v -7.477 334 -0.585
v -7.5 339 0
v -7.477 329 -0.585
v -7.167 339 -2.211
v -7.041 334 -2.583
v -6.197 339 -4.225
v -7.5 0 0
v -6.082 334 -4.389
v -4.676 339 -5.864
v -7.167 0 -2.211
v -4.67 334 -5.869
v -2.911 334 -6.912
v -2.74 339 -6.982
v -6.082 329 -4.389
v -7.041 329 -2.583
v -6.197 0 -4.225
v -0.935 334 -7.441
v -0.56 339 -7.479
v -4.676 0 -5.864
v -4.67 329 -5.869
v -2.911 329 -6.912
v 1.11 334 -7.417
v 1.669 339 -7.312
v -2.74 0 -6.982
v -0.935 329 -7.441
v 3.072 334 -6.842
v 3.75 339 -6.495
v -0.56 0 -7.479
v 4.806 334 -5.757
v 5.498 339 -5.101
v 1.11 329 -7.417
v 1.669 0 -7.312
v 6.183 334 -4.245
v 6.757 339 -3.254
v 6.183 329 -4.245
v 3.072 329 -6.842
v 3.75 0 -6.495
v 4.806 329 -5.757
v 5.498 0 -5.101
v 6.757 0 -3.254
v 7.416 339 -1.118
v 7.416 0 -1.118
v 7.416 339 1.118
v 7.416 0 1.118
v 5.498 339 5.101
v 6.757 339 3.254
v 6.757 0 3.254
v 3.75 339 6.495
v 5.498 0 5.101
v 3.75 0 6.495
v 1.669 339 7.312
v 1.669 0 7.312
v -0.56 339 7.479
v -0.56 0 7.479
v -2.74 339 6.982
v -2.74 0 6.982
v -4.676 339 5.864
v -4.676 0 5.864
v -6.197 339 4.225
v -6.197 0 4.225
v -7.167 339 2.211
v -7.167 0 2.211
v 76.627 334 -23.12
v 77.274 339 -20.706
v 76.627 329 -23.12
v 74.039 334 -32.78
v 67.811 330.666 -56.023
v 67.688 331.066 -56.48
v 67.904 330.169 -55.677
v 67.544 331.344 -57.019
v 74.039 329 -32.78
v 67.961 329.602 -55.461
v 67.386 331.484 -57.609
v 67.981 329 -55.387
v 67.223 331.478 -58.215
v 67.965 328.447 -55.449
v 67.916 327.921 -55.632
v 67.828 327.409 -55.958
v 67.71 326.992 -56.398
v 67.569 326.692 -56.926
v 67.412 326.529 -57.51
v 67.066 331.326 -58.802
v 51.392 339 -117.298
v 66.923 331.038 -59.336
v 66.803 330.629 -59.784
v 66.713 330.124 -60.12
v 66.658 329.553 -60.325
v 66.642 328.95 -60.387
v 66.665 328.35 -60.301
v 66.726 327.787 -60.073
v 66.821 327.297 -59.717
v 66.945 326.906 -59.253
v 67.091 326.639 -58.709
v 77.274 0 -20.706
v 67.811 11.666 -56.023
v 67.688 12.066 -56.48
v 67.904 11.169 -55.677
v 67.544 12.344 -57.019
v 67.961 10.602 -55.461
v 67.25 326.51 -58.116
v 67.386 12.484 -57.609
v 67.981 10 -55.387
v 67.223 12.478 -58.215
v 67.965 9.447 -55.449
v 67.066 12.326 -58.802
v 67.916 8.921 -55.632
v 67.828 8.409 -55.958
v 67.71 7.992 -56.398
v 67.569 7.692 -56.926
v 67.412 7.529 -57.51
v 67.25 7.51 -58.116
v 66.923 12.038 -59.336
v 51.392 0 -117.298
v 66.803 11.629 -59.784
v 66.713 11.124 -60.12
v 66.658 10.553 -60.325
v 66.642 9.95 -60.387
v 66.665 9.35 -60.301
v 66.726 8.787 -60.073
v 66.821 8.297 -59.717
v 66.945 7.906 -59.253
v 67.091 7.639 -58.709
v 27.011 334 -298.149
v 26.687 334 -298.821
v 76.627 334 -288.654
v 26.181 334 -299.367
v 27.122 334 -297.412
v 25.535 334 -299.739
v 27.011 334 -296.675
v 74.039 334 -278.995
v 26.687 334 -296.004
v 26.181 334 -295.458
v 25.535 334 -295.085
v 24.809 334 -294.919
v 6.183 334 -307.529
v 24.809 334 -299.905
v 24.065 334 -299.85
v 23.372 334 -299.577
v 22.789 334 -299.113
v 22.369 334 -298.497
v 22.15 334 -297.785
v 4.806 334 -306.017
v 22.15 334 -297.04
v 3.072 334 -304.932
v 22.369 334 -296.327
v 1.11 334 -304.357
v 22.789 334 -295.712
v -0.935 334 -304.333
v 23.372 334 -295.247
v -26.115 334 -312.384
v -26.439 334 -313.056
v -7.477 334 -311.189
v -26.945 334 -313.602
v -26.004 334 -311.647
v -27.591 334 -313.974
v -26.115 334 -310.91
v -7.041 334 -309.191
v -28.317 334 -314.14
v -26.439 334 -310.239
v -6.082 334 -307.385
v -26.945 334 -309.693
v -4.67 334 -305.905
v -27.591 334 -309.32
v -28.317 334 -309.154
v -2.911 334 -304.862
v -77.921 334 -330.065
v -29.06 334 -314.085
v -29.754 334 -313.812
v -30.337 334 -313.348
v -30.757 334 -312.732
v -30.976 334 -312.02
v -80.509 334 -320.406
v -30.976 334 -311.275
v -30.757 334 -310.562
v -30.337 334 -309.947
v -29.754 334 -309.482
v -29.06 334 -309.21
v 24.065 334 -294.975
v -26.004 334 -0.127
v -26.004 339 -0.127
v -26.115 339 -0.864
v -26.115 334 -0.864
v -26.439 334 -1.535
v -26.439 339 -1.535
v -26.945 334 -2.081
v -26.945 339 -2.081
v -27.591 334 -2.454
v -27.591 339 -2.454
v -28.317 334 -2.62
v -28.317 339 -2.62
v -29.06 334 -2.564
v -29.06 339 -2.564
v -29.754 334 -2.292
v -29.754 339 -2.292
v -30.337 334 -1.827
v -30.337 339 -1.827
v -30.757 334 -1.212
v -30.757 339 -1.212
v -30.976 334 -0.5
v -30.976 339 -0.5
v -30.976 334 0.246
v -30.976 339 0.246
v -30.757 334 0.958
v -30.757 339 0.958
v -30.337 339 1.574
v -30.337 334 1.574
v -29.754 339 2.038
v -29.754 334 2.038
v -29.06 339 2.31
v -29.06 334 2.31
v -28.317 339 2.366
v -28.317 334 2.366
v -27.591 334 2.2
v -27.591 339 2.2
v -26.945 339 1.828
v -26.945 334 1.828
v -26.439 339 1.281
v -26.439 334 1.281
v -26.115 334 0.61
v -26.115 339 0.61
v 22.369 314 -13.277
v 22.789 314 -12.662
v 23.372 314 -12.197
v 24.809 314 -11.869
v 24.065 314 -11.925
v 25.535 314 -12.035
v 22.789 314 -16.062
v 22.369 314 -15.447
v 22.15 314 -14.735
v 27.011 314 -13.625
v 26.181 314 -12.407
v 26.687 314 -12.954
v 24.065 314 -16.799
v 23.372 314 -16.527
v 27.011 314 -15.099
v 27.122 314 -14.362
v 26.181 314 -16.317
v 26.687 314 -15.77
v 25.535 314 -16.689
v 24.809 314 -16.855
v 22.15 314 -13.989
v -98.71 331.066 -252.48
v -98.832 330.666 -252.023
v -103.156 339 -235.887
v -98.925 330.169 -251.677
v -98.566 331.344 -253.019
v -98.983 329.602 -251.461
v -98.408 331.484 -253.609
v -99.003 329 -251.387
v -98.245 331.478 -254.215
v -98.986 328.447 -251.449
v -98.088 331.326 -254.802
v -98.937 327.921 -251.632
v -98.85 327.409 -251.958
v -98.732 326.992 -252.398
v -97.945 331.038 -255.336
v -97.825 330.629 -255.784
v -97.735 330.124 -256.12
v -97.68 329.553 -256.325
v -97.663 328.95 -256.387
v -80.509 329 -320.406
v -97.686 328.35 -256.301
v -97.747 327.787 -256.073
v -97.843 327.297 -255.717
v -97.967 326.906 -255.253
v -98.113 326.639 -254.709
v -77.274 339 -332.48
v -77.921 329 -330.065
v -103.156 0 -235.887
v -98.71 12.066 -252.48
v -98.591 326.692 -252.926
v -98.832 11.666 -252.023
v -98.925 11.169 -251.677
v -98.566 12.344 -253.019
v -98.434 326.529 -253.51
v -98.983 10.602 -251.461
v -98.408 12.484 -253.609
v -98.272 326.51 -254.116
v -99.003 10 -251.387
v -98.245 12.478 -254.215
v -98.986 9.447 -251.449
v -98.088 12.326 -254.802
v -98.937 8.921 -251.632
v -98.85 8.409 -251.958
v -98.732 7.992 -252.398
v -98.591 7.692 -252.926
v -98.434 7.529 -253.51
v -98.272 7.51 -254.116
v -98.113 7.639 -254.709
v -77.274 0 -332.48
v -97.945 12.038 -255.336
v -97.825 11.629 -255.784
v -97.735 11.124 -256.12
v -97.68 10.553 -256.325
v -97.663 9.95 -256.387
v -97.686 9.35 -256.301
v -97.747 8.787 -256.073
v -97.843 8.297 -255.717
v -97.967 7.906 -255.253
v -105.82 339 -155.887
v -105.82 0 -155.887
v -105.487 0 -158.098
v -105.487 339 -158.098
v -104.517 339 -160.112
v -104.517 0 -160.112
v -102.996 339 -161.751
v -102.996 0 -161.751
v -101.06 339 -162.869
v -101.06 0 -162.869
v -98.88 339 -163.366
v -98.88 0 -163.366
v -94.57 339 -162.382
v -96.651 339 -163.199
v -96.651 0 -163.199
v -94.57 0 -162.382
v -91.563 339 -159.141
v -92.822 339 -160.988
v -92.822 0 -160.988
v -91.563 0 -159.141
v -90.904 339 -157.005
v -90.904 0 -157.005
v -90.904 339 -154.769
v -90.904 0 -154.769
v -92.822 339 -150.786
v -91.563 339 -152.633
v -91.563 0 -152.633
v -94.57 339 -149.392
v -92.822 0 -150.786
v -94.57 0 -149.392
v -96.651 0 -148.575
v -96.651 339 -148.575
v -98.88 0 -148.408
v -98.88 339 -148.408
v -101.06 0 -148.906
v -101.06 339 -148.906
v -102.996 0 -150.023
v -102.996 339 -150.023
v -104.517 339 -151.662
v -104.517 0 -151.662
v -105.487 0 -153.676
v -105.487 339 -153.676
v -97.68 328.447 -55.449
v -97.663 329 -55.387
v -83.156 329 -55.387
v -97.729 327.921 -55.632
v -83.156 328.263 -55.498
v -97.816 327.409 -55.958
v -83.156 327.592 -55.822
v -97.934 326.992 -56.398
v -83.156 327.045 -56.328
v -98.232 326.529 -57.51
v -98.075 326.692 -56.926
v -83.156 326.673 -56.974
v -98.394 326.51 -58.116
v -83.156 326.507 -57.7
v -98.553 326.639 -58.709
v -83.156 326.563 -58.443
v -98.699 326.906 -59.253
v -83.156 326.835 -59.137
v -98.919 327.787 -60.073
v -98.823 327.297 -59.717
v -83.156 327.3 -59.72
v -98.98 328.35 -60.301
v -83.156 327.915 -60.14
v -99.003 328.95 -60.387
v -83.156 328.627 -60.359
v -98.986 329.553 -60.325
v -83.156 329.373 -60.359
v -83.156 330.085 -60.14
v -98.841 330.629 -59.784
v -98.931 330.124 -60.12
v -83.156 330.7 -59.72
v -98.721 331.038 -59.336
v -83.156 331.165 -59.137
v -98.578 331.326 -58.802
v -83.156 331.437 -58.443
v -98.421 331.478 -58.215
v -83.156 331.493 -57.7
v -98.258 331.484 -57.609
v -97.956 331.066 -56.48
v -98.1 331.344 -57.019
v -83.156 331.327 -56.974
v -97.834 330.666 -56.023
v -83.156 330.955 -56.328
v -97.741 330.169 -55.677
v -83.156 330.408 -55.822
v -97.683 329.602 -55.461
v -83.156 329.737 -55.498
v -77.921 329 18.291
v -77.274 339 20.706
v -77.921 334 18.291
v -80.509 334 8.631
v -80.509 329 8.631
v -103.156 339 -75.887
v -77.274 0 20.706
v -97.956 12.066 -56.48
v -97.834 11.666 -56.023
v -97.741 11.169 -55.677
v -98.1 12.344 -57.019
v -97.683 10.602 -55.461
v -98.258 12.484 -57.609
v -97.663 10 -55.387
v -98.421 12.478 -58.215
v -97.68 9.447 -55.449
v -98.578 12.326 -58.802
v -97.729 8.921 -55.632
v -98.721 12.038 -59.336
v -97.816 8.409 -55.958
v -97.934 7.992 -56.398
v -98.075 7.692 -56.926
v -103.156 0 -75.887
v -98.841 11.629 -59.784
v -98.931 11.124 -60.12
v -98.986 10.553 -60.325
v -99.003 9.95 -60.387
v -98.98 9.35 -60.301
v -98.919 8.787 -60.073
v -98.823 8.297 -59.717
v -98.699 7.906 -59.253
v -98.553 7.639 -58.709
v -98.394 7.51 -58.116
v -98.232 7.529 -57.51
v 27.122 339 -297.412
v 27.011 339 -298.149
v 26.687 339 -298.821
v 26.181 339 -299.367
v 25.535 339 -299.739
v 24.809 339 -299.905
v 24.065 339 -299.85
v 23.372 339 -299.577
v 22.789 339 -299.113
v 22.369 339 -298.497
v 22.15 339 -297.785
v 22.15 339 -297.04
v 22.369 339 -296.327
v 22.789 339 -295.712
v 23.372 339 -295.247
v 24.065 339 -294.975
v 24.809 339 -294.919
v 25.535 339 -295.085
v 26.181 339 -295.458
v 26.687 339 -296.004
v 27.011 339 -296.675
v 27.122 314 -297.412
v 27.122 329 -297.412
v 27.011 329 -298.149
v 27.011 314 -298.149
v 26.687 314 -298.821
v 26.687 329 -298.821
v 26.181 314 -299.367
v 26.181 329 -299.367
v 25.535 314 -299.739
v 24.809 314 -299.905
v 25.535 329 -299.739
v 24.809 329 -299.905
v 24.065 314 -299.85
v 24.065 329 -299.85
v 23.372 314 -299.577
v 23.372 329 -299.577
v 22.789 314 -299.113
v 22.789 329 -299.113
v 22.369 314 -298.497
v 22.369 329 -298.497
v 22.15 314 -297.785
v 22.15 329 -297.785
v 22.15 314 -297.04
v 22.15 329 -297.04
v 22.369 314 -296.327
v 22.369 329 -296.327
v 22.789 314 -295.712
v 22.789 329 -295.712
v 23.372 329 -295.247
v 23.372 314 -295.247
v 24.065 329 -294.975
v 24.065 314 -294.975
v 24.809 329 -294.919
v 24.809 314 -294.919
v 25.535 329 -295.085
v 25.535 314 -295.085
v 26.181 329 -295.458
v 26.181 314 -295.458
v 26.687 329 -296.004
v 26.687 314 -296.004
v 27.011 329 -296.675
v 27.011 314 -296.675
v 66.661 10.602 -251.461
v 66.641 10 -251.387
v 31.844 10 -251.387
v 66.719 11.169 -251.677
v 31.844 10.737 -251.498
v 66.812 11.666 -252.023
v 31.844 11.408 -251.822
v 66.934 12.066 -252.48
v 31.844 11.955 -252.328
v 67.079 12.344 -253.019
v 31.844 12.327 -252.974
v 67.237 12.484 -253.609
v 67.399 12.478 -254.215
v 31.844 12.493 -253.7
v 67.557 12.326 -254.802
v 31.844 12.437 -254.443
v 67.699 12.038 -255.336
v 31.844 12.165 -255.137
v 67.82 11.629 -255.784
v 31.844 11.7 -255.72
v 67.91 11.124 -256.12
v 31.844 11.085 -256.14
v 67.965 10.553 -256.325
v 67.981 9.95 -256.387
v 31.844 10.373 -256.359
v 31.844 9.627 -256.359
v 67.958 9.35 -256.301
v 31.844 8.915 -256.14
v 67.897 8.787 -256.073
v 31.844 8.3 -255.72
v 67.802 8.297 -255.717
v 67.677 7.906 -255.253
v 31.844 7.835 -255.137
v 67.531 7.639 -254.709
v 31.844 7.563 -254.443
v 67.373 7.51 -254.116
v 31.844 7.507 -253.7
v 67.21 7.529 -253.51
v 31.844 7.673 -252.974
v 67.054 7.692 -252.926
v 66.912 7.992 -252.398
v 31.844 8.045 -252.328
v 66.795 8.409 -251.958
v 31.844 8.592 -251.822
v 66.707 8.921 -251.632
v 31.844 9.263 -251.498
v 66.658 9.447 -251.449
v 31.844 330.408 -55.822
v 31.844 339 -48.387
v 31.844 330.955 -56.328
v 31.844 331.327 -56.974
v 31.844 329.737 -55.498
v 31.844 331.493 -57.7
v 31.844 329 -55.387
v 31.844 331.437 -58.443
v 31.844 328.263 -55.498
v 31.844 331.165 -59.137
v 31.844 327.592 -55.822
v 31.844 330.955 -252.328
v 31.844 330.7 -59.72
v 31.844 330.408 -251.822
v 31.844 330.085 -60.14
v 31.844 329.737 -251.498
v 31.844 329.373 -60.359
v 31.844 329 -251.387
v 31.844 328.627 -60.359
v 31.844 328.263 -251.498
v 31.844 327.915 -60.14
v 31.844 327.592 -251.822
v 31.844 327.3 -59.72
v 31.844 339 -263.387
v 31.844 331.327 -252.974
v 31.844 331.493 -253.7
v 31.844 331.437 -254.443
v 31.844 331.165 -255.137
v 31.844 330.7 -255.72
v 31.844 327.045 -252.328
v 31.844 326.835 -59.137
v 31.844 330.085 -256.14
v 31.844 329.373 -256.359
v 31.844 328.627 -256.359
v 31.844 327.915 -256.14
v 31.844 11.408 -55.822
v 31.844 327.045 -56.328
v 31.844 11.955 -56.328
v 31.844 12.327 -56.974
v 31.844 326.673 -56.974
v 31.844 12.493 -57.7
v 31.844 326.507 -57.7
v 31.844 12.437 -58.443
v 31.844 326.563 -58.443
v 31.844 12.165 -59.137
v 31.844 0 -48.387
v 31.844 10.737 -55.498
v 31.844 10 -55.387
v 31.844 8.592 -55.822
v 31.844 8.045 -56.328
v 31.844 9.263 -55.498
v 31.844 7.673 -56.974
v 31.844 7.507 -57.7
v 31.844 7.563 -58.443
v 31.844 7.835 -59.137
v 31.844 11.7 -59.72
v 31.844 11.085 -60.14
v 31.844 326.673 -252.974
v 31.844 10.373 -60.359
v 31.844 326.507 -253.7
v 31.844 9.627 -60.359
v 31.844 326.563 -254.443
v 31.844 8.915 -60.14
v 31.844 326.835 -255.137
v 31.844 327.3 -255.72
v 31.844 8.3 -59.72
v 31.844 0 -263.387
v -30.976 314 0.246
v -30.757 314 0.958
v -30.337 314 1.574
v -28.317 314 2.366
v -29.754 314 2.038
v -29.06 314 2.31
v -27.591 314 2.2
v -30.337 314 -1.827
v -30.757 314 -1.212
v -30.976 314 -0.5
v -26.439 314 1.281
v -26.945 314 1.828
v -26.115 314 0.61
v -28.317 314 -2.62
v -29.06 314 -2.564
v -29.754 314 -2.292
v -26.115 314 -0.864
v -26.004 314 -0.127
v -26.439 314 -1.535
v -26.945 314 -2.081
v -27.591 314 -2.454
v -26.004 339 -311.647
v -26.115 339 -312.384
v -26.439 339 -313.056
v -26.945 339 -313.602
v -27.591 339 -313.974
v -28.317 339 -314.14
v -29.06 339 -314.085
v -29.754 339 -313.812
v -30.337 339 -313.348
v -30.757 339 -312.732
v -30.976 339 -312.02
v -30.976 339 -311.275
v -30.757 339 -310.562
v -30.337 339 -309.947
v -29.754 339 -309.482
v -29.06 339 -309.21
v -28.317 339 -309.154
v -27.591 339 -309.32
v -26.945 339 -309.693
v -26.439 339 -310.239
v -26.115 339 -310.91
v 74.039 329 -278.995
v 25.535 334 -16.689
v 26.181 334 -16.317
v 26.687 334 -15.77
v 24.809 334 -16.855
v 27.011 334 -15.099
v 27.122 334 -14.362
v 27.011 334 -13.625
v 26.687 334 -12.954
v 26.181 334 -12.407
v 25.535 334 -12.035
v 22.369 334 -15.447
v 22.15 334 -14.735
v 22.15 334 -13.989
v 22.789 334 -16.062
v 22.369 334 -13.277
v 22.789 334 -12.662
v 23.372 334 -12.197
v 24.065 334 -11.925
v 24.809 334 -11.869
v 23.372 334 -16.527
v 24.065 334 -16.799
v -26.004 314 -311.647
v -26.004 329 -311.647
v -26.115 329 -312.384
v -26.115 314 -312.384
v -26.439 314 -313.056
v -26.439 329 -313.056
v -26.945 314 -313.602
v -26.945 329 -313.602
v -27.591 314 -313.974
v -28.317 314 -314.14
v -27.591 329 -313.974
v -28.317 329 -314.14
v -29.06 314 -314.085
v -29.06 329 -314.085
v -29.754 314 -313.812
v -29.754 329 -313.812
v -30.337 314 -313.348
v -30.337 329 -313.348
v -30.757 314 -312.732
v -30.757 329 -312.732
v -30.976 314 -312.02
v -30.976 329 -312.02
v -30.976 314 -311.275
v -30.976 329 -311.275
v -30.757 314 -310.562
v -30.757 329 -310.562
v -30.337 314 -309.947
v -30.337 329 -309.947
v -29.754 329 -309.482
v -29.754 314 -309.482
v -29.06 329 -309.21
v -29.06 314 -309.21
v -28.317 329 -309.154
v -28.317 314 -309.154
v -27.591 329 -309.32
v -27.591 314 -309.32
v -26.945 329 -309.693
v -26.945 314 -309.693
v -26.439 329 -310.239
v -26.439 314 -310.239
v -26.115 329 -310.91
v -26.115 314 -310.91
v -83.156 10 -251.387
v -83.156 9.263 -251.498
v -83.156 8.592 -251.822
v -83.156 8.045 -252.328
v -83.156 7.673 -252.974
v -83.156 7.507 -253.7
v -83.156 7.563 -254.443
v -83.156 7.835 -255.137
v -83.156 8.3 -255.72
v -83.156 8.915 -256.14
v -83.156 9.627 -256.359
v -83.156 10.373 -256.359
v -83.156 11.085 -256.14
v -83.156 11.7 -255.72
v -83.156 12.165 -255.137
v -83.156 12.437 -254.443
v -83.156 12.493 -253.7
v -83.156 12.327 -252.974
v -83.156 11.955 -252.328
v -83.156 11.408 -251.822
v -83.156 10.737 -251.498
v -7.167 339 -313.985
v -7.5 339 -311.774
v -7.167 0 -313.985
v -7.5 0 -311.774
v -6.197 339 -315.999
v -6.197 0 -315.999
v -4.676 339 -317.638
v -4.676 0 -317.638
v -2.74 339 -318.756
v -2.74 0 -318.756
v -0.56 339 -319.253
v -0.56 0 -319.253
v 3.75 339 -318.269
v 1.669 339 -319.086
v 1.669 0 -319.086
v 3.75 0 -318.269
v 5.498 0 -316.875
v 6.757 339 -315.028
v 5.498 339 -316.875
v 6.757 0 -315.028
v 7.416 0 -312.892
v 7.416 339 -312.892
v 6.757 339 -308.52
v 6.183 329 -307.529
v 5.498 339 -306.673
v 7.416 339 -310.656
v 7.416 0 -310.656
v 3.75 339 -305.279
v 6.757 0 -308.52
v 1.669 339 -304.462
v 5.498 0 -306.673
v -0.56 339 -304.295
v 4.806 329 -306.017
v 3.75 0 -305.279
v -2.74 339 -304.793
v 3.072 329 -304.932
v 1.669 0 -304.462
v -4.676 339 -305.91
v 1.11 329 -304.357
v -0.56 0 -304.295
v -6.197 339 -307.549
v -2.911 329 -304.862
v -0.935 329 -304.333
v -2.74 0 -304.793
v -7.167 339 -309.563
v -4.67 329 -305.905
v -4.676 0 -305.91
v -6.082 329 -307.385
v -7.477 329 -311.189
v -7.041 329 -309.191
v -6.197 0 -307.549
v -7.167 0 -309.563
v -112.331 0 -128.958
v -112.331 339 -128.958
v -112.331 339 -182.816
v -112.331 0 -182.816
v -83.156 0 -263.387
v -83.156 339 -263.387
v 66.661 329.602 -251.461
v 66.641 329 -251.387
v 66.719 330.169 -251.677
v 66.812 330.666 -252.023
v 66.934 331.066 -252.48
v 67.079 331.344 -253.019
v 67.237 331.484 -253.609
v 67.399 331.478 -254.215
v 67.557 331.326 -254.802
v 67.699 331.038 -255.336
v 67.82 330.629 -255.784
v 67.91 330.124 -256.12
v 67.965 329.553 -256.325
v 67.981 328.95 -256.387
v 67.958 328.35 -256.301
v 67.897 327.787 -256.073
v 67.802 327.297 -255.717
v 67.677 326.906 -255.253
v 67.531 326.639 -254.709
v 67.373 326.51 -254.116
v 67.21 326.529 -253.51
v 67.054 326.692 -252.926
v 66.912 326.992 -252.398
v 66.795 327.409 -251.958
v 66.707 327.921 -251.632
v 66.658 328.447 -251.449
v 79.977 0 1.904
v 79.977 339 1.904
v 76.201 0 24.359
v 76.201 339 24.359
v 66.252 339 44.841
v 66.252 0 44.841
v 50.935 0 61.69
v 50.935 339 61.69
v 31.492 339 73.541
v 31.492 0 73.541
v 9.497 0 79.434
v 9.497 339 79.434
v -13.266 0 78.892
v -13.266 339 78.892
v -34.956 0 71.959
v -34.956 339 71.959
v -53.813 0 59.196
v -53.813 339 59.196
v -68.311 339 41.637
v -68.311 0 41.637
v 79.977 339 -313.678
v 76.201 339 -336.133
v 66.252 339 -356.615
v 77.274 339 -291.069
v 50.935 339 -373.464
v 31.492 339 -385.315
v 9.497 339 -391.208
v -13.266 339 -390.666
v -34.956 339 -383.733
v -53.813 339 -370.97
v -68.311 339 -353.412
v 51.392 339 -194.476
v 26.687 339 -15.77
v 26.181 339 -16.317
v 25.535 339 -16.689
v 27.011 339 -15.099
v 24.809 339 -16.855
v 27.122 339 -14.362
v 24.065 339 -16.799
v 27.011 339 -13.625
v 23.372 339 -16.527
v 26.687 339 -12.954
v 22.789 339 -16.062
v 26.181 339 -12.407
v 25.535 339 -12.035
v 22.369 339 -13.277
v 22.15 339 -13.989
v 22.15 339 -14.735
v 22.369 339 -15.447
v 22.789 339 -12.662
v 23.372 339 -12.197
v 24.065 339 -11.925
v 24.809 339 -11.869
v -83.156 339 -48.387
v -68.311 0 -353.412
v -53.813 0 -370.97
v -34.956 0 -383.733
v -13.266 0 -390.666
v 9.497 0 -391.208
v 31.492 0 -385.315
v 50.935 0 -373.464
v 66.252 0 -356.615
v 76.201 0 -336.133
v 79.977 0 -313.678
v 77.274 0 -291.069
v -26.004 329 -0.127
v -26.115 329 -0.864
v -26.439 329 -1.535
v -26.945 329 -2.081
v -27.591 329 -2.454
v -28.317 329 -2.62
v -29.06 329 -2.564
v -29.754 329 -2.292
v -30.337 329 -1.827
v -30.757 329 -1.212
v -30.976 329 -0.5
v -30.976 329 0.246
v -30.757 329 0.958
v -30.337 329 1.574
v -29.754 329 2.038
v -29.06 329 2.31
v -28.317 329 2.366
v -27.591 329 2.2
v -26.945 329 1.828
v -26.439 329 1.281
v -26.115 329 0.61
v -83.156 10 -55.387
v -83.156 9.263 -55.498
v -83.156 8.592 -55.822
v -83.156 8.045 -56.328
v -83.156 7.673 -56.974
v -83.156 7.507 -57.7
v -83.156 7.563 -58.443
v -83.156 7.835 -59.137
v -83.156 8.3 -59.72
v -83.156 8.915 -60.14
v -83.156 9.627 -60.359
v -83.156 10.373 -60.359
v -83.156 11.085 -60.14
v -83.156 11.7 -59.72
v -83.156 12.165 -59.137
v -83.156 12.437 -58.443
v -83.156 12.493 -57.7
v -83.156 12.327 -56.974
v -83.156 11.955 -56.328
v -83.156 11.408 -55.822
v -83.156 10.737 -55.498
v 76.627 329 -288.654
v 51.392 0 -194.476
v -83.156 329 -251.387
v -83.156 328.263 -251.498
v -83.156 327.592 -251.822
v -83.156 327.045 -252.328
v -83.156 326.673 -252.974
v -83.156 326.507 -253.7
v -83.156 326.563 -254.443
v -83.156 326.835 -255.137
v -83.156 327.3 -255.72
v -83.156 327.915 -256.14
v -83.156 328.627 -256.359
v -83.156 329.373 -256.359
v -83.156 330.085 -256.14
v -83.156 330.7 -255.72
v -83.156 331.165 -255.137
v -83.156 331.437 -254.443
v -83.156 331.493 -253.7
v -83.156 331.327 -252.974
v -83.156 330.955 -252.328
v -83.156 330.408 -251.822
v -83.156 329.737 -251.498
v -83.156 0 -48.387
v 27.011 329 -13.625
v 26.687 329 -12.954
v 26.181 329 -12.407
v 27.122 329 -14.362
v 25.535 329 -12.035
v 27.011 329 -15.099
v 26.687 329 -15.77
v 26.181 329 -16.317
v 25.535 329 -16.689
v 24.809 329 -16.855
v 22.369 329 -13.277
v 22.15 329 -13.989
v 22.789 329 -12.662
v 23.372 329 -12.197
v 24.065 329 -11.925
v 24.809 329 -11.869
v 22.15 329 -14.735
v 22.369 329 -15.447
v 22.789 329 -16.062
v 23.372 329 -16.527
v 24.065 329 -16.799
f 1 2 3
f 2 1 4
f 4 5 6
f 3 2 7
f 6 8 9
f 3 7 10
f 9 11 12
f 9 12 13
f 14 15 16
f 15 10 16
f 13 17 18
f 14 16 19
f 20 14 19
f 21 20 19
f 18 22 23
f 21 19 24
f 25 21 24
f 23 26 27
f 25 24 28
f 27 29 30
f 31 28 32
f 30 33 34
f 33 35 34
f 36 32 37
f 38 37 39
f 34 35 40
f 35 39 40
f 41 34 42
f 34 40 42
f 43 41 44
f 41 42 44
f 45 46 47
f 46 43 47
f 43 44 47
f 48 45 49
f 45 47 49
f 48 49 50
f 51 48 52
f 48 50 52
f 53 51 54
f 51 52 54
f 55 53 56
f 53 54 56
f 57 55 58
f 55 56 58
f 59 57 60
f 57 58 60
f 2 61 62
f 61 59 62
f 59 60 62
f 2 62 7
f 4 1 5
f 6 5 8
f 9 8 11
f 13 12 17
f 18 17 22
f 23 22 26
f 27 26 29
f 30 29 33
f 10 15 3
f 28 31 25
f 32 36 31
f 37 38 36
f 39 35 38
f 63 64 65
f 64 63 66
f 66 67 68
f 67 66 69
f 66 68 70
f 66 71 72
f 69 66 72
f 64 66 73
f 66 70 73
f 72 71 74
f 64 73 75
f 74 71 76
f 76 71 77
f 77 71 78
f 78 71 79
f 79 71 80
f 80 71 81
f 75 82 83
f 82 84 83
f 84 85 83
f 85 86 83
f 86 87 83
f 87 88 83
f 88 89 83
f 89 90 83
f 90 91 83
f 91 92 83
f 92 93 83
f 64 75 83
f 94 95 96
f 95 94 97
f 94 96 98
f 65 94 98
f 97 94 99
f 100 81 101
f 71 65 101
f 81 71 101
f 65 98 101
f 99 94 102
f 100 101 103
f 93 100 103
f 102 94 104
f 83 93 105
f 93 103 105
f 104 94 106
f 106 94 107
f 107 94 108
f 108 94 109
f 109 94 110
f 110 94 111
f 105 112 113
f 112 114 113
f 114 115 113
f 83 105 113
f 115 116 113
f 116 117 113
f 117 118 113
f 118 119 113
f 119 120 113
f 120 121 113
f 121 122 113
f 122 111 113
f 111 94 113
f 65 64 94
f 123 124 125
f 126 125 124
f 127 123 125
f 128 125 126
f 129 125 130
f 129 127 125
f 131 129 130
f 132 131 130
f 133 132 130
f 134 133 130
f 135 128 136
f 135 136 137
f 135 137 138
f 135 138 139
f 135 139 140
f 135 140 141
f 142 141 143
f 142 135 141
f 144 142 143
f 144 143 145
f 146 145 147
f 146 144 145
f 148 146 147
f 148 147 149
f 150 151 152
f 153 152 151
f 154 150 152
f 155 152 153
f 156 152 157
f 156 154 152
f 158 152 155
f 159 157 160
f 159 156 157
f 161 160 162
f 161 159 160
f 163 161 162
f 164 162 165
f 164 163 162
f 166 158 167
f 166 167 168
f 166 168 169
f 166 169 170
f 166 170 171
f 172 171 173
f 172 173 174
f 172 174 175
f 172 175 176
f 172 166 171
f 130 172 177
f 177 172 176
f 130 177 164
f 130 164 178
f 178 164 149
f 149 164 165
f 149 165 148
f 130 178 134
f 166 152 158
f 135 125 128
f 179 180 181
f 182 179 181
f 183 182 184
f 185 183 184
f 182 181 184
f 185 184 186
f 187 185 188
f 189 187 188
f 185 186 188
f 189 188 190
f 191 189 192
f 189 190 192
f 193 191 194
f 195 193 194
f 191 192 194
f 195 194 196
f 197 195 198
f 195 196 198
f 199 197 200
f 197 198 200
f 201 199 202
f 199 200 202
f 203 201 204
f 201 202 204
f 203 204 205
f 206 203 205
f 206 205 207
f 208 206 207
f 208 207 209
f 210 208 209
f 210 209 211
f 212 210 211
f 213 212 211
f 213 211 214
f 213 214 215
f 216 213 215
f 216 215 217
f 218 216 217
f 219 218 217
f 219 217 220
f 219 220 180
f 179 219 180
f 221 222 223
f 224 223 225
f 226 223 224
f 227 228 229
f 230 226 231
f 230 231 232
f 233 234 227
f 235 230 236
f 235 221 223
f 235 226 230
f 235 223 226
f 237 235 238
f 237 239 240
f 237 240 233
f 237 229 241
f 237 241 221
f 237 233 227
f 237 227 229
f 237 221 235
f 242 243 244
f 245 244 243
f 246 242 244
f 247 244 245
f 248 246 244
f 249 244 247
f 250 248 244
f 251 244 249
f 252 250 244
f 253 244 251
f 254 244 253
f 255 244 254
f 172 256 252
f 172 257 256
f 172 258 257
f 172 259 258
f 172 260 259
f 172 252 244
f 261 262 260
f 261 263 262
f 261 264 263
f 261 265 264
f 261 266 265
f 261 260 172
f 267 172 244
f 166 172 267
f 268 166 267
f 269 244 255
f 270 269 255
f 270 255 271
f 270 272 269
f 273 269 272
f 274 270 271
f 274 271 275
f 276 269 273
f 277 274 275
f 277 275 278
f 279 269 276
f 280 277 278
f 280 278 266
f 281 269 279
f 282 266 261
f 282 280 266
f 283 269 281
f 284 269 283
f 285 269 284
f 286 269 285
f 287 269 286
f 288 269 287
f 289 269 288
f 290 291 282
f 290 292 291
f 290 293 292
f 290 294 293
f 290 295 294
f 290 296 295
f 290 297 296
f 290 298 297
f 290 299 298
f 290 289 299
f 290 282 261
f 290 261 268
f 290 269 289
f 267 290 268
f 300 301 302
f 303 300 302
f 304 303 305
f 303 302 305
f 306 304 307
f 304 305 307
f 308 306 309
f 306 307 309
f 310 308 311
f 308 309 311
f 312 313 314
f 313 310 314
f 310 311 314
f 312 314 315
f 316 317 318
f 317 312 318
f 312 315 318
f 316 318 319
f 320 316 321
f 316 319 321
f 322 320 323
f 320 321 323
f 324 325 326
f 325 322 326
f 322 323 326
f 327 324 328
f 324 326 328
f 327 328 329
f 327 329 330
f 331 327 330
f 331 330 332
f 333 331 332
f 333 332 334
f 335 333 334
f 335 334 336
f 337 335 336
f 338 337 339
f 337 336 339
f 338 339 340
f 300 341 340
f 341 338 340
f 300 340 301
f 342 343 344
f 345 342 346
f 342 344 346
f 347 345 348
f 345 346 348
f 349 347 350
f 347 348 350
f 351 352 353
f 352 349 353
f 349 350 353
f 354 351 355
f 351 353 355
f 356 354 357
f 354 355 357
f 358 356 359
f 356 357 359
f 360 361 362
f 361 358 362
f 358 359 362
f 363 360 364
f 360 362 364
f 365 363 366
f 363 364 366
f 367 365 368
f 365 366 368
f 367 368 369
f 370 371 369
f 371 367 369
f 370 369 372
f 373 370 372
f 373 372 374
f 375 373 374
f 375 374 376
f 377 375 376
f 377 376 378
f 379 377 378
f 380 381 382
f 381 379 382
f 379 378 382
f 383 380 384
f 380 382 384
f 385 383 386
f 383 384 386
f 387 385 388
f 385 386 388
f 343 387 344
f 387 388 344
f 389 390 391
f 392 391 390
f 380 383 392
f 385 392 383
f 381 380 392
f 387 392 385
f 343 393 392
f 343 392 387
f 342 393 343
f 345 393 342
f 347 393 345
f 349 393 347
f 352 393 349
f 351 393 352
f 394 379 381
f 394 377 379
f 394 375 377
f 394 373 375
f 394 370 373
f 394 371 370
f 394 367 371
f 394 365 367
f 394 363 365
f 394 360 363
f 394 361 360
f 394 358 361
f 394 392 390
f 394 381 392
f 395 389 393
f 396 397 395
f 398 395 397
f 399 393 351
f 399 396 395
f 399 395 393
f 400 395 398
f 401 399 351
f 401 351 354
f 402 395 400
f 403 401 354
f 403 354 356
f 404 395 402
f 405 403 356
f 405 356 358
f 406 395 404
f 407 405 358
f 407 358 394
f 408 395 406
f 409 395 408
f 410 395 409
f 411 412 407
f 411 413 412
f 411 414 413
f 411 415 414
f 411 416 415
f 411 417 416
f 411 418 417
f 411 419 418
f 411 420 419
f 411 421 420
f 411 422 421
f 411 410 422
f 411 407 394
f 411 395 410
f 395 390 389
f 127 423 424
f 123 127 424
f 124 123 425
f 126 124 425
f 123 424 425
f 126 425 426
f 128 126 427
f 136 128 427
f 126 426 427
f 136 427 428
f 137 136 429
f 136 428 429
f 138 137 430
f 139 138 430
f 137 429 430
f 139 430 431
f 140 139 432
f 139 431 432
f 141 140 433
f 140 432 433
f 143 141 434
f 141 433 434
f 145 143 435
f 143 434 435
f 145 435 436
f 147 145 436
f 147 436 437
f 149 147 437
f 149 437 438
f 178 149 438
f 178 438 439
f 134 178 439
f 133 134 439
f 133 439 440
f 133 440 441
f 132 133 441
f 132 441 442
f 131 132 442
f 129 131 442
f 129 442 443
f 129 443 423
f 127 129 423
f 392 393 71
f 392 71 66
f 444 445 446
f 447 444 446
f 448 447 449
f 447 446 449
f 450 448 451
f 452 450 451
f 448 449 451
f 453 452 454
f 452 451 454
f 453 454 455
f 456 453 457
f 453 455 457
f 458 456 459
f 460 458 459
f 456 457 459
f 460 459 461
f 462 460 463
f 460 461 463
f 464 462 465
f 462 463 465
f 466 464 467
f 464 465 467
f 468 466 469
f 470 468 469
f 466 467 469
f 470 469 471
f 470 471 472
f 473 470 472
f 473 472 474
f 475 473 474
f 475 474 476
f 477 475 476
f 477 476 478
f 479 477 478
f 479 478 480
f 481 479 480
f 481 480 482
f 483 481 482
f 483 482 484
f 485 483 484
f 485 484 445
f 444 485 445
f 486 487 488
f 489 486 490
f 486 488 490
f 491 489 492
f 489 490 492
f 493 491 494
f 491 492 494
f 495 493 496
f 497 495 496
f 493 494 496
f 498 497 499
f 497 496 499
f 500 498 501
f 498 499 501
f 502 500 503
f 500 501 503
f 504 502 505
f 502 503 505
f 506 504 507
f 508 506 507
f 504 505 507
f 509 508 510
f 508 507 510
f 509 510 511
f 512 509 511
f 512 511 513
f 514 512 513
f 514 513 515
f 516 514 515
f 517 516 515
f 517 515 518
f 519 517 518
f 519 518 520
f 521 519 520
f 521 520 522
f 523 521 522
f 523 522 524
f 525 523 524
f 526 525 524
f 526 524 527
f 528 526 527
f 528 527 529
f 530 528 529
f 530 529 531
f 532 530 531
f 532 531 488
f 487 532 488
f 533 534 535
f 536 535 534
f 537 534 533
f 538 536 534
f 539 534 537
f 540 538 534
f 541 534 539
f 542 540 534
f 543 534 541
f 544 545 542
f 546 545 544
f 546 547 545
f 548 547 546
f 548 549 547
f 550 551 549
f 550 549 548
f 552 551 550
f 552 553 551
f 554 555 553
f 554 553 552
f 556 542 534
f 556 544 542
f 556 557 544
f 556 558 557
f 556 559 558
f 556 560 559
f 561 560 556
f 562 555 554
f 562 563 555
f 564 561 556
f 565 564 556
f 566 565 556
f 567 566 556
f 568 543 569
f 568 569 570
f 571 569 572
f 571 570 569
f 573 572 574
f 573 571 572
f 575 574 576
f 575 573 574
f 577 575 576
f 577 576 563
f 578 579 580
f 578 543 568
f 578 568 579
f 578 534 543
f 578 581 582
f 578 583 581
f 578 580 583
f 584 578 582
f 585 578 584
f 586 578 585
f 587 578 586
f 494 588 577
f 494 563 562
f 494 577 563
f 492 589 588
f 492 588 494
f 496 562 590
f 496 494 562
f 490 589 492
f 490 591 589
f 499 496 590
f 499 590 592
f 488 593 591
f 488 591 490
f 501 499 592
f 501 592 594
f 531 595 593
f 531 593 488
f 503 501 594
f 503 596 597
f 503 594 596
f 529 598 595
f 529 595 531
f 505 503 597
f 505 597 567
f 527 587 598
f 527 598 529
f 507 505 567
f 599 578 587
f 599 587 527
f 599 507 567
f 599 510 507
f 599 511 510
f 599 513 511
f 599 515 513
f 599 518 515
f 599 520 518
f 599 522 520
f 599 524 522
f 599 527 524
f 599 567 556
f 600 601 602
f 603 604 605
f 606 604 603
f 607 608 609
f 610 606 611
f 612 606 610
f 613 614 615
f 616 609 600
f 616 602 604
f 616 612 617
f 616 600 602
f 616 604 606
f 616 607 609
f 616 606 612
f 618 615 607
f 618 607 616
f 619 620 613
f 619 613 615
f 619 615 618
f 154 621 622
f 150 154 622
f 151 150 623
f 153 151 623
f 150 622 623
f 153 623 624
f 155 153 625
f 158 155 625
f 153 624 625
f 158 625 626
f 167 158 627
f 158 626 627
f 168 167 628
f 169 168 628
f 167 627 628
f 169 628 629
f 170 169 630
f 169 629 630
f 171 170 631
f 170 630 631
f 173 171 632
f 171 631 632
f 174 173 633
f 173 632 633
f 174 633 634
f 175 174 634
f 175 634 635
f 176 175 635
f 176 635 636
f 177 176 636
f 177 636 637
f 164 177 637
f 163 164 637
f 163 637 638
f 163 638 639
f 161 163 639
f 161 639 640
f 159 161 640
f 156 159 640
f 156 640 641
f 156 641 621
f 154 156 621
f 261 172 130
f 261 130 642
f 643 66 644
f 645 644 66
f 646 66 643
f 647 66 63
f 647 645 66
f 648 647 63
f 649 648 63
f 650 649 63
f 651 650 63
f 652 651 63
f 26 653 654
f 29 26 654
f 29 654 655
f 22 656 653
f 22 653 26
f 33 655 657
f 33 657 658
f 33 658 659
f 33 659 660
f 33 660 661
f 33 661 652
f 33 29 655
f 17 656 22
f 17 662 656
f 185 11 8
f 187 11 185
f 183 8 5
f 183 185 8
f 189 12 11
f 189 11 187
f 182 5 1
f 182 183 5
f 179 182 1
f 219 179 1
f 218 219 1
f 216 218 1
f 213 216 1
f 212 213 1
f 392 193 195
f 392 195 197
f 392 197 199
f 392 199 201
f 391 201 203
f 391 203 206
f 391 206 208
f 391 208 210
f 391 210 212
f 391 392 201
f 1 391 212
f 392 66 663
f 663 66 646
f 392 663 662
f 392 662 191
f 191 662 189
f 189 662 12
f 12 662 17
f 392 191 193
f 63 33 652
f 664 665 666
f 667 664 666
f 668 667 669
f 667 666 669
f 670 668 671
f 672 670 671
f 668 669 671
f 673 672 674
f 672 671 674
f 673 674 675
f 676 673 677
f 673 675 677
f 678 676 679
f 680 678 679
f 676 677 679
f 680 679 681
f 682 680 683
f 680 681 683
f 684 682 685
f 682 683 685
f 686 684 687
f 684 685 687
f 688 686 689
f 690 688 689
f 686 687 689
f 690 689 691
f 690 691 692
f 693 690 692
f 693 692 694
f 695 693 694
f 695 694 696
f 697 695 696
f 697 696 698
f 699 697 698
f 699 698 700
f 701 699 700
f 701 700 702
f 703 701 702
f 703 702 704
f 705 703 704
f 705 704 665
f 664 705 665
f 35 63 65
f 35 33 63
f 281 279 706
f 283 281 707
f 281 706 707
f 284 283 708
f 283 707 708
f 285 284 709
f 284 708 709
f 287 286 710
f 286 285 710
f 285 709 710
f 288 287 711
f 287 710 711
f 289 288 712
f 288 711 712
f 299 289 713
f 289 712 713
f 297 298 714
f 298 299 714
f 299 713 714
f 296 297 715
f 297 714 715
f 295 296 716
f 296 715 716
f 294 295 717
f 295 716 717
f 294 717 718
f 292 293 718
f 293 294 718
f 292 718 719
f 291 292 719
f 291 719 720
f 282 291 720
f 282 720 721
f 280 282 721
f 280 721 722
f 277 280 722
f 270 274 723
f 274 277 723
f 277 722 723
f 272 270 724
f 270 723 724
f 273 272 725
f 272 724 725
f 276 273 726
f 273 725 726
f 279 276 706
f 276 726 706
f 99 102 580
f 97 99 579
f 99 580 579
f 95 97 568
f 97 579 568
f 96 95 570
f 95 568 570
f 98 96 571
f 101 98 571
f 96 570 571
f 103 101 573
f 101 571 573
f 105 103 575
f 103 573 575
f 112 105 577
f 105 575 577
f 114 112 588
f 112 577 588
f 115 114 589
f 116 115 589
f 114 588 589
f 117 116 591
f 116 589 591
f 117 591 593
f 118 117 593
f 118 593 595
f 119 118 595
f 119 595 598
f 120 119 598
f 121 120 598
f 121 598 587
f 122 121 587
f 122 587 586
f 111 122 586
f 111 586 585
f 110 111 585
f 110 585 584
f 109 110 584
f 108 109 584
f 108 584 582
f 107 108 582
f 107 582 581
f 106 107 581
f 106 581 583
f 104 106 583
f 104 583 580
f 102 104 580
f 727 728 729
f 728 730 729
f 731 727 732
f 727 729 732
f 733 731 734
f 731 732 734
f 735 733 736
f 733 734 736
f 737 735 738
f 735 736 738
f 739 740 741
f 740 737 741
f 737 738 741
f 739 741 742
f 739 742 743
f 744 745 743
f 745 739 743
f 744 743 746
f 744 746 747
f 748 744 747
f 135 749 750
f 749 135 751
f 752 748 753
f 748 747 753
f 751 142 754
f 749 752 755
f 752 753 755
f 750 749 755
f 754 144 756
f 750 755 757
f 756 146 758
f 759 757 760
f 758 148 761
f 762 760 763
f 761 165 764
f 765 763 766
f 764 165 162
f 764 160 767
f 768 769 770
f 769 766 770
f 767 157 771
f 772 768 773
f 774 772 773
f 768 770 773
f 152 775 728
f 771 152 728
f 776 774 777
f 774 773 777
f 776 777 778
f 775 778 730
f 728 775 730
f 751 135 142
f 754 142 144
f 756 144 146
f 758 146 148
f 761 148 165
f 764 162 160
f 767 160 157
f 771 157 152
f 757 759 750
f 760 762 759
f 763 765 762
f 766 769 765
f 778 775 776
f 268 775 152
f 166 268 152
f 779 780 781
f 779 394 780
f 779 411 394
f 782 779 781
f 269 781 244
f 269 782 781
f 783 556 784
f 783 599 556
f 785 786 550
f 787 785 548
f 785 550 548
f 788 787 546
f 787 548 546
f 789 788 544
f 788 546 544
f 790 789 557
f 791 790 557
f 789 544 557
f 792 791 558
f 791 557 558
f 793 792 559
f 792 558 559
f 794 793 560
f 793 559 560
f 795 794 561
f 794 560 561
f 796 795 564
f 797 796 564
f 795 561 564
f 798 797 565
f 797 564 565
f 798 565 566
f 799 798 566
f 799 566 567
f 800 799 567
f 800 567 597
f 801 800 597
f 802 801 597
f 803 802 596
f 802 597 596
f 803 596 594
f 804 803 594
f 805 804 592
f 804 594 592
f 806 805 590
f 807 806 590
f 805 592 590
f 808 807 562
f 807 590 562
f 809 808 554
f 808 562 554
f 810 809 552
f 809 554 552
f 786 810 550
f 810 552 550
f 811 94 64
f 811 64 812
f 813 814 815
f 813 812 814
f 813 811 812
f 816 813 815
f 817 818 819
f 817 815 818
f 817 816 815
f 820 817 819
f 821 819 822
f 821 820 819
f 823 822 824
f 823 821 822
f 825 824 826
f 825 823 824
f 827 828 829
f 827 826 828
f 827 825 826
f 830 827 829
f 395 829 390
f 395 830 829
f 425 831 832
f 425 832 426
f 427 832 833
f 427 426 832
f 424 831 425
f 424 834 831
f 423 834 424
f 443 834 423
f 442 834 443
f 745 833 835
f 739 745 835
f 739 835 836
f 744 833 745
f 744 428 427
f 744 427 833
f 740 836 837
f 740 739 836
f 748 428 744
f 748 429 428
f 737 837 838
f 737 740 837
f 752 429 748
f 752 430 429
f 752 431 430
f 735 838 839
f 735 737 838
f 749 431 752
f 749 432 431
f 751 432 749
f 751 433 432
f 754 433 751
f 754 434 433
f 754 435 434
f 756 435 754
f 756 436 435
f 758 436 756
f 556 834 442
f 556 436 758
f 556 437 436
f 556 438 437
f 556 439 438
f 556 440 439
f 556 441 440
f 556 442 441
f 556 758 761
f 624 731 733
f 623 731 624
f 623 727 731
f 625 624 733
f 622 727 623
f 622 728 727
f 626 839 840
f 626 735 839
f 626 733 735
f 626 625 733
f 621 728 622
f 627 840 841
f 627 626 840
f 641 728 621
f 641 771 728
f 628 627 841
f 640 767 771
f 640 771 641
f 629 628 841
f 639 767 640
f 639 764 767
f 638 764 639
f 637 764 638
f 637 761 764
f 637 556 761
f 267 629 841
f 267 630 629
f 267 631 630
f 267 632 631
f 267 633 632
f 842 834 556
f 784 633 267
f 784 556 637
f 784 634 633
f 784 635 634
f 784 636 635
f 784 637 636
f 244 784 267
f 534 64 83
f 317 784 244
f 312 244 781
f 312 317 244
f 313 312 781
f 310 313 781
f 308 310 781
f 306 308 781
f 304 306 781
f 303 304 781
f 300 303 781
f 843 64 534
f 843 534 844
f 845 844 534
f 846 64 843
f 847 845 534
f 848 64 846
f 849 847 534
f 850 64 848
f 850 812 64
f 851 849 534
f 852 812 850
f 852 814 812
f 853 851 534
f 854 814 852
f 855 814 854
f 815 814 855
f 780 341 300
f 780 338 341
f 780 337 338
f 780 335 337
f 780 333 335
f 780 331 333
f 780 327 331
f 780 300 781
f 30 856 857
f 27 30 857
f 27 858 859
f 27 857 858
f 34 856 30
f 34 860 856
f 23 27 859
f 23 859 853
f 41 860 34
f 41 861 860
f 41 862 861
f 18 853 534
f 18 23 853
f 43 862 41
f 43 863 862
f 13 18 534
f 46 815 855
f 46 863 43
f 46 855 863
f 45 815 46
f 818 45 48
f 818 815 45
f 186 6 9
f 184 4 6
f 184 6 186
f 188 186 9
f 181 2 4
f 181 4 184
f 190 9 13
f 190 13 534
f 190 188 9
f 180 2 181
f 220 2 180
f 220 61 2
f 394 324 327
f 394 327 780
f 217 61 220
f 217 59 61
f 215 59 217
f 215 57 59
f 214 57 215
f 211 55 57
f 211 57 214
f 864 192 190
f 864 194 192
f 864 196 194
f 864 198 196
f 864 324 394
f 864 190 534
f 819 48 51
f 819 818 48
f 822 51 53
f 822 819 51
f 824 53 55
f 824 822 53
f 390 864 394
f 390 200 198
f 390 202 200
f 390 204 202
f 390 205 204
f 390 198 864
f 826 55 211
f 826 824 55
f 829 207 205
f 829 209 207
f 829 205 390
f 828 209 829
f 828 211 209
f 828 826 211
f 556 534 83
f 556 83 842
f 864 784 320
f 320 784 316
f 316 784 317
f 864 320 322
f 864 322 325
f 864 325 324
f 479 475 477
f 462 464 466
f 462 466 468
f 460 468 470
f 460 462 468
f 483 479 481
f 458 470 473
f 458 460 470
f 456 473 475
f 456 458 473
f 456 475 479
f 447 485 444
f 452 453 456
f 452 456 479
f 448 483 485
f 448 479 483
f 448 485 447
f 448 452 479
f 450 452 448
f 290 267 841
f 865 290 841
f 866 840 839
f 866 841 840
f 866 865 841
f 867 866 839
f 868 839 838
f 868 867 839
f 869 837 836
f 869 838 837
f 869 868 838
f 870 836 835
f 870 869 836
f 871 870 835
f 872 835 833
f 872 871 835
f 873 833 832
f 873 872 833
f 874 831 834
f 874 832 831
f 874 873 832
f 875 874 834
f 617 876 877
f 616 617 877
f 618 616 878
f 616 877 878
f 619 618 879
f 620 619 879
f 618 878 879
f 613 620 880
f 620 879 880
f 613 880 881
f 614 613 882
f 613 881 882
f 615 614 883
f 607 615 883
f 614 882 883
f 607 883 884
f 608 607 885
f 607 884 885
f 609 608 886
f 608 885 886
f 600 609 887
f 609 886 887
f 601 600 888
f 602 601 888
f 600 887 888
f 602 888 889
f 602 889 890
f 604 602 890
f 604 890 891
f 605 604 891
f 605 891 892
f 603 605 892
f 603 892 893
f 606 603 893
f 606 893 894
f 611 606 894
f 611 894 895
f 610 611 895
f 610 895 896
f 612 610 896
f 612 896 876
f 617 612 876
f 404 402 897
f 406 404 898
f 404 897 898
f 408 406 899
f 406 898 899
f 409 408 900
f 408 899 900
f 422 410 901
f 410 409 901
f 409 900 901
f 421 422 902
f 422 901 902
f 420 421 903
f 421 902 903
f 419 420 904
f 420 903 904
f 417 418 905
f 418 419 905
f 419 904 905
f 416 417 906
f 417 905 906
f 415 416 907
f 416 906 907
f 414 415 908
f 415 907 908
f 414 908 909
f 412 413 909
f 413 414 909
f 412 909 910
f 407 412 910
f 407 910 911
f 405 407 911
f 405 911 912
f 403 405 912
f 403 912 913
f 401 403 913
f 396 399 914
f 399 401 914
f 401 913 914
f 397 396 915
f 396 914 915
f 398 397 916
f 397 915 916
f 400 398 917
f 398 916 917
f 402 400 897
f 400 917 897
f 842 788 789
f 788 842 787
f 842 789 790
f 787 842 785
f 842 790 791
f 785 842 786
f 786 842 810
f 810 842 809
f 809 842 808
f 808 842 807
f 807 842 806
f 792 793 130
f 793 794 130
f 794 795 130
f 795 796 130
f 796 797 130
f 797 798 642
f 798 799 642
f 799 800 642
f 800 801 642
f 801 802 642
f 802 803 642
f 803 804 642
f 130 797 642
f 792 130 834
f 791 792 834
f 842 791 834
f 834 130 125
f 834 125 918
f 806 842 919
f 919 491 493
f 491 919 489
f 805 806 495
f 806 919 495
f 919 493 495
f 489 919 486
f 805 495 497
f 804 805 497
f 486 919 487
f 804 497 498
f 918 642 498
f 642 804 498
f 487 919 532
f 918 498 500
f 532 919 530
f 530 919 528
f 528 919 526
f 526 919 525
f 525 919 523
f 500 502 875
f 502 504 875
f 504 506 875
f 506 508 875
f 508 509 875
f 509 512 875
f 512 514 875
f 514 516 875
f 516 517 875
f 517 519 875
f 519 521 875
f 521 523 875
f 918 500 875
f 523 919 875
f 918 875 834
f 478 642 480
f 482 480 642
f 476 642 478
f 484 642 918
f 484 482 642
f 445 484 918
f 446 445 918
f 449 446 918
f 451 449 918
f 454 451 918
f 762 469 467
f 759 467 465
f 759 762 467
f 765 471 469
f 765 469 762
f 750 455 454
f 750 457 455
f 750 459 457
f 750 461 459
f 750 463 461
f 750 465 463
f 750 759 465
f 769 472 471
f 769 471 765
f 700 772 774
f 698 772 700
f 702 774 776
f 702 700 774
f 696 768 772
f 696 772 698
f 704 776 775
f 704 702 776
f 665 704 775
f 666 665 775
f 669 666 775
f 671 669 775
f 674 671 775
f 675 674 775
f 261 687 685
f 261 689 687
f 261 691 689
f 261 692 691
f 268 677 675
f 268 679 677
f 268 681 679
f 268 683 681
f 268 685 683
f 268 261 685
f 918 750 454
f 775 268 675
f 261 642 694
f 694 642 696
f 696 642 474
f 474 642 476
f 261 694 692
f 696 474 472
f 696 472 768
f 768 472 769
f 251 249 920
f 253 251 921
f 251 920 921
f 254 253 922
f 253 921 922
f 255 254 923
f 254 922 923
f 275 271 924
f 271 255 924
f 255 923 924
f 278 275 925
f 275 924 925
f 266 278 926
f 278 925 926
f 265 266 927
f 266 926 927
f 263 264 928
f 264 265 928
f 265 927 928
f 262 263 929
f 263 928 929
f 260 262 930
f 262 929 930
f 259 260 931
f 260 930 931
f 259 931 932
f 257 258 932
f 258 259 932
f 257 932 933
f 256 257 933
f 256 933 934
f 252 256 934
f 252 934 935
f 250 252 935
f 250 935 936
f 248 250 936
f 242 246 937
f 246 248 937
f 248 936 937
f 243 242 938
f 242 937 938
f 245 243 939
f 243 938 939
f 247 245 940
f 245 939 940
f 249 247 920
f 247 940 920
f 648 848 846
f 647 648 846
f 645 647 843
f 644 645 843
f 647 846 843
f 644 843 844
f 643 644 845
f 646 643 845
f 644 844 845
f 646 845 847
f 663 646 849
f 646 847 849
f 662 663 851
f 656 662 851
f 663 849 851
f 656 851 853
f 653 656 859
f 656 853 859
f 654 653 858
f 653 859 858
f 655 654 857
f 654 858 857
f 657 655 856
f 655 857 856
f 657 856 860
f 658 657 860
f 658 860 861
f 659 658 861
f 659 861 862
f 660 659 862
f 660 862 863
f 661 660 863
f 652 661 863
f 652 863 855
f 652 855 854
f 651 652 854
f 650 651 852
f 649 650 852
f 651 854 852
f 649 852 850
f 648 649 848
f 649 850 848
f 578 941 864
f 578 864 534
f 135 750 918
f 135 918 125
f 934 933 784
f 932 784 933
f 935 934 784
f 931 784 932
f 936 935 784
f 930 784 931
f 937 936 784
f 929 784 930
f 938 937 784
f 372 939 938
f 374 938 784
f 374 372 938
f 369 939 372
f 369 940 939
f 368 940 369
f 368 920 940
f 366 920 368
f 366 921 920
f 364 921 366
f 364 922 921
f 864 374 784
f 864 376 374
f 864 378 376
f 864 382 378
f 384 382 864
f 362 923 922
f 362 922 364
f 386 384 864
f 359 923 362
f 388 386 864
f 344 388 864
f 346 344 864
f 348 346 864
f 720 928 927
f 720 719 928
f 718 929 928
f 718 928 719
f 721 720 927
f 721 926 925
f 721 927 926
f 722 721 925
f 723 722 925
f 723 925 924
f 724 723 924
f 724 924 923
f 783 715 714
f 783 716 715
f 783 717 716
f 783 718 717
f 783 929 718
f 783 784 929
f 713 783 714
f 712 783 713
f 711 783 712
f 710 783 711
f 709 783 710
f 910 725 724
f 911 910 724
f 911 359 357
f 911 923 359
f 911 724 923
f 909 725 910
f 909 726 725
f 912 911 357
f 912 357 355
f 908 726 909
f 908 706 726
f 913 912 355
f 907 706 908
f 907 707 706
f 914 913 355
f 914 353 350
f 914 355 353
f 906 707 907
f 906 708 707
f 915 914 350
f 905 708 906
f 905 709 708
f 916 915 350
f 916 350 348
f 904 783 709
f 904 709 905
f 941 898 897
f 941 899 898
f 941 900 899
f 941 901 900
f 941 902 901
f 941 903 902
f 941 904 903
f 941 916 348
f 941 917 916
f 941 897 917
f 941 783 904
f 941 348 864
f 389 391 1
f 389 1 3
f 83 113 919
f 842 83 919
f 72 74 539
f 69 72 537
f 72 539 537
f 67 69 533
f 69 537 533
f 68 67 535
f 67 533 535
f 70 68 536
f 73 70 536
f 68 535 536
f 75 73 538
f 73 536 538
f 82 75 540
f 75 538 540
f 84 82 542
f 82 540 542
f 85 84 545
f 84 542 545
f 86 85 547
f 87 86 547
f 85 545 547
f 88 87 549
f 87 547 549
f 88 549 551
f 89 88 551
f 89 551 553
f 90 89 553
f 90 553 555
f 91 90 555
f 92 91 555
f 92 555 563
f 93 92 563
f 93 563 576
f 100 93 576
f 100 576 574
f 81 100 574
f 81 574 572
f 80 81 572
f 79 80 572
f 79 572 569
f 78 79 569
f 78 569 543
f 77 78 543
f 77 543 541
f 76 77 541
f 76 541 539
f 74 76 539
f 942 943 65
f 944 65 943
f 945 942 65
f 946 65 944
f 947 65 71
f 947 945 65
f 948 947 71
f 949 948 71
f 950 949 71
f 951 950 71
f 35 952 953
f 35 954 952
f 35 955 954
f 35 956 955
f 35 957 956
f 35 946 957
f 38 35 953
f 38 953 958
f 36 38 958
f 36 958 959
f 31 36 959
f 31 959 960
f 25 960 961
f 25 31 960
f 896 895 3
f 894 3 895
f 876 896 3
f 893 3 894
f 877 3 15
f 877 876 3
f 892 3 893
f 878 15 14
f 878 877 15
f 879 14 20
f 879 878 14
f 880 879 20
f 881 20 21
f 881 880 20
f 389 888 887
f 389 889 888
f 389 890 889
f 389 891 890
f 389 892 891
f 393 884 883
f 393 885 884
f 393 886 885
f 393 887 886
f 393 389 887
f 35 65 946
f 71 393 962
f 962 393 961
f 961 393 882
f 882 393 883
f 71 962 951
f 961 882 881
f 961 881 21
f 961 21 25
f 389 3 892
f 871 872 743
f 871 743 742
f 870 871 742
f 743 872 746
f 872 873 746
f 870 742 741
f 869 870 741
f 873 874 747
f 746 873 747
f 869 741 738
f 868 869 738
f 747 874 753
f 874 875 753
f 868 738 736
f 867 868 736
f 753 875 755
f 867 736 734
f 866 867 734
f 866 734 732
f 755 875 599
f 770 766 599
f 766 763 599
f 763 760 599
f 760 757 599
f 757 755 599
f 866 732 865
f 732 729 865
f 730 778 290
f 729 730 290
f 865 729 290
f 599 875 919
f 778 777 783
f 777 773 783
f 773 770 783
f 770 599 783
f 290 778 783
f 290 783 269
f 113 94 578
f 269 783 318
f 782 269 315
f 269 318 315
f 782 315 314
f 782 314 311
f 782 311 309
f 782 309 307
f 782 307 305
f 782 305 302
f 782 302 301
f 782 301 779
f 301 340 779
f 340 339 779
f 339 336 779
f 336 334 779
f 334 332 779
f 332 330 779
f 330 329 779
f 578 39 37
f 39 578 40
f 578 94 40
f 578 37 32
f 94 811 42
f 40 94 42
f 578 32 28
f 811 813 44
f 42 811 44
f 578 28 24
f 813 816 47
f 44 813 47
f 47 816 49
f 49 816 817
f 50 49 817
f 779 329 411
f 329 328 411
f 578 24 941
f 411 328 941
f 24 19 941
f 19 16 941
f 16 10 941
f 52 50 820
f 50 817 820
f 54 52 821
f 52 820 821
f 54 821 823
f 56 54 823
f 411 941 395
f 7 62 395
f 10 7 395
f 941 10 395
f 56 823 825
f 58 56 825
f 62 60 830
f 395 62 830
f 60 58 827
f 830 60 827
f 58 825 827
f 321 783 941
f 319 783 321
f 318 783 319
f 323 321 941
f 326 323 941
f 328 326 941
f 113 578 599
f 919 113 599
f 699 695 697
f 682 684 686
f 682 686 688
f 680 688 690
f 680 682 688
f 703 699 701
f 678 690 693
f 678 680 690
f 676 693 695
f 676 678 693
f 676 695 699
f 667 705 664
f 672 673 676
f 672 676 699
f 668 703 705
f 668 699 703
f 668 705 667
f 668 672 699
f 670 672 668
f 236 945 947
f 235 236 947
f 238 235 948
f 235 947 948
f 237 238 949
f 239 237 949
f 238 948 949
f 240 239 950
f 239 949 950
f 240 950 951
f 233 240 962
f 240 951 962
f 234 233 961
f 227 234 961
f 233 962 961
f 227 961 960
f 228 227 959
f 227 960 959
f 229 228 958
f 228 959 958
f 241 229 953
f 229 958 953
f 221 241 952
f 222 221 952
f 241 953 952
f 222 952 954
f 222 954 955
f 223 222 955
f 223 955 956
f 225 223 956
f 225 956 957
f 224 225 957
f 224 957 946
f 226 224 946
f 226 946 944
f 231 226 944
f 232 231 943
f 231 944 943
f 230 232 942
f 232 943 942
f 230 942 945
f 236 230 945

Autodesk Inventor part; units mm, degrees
ref_plane "YZ Plane" through (0, 0, 0) normal (1, 0, 0) x (0, 1, 0)
ref_plane "XZ Plane" through (0, 0, 0) normal (0, 1, 0) x (-1, 0, 0)
ref_plane "XY Plane" through (0, 0, 0) normal (0, 0, 1) x (1, 0, 0)
sketch "Sketch2" plane through (0, 0, 0) normal (0, 1, 0) x (-1, 0, 0)
  circle A0 centre (0, 0) radius 80 construction
  line L0 (77.2741, 20.7055) -> (103.156, -75.8871)
  line L1 (-77.2741, -20.7055) -> (-51.3922, -117.2981)
  line L2 (103.156, -75.8871) -> (-51.3922, -117.2981) construction
  line L3 (103.156, -75.8871) -> (103.156, -235.8871) construction
  line L4 (103.156, -235.8871) -> (-51.3922, -194.476) construction
  line L5 (-51.3922, -117.2981) -> (-51.3922, -194.476)
  circle A1 centre (0, -311.7741) radius 80 construction
  line L6 (-51.3922, -194.476) -> (-77.2741, -291.0686)
  line L7 (103.156, -235.8871) -> (77.2741, -332.4796)
  arc A2 (77.2741, 20.7055) -> (-77.2741, -20.7055) centre (0, 0) ccw
  arc A3 (-77.2741, -291.0686) -> (77.2741, -332.4796) centre (0, -311.7741) ccw
  circle A4 centre (0, 0) radius 7.5
  circle A5 centre (0, -311.7741) radius 7.5
  line L8 (83.156, -48.3871) -> (-31.844, -48.3871)
  line L9 (-31.844, -48.3871) -> (-31.844, -263.3871)
  line L10 (-31.844, -263.3871) -> (83.156, -263.3871)
  line L11 (83.156, -263.3871) -> (83.156, -48.3871)
  arc A6 (103.156, -235.8871) -> (103.156, -75.8871) centre (-201.516, -155.8871) ccw
  circle A7 centre (98.32, -155.8871) radius 7.5
  point P0 (103.156, -155.8871)
  point P1 (83.156, -155.8871)
  dimension "d0" = 160
  dimension "d1" = 100
  dimension "d2" = 100
  dimension "d3" = 160
  dimension "d4" = 160
  dimension "d5" = 160
  dimension "d6" = 75
  dimension "d7" = 75
  dimension "d8" = 160
  dimension "d9" = 100
  dimension "d10" = 100
  dimension "d11" = 15
  dimension "d12" = 15
  dimension "d13" = 115
  dimension "d14" = 215
  dimension "d15" = 20
  dimension "d39" = 315
  dimension "d40" = 15
  dimension "d41" = 15.164
extrude "Extrusion1" add sketch "Sketch2" along normal blind 339
sketch "Sketch5" plane through (31.844, 0, -48.3871) normal (-1, 0, 0) x (0, 0, 1)
  line L0 (0, 0) -> (-215, 0) construction
  line L1 (0, 0) -> (0, 339) construction
  line L2 (-215, 339) -> (0, 339) construction
  line L3 (-215, 0) -> (-215, 339) construction
  line L4 (-68.911, 0) -> (27.6815, 0) construction
  line L5 (0, 339) -> (-19, 339) construction
  line L6 (-19, 339) -> (-19, 0) construction
  line L7 (-19, 0) -> (0, 0) construction
  line L8 (0, 0) -> (0, 339) construction
  line L9 (-146.089, 339) -> (-242.6815, 339) construction
  line L10 (-215, 0) -> (-196, 0) construction
  line L11 (-196, 0) -> (-196, 339) construction
  line L12 (-196, 339) -> (-215, 339) construction
  line L13 (-215, 339) -> (-215, 0) construction
  circle A0 centre (-205.5, 329) radius 2.5
  circle A1 centre (-205.5, 10) radius 2.5
  circle A2 centre (-9.5, 329) radius 2.5
  circle A3 centre (-9.5, 10) radius 2.5
  point P0 (-205.5, 0)
  point P1 (-205.5, 339)
  point P2 (-9.5, 0)
  point P3 (-9.5, 339)
  dimension "d52" = 19
  dimension "d53" = 19
  dimension "d54" = 5
  dimension "d55" = 10
  dimension "d56" = 5
  dimension "d57" = 10
  dimension "d58" = 5
  dimension "d59" = 5
  dimension "d60" = 10
  dimension "d61" = 10
extrude "Extrusion4" cut sketch "Sketch5" along normal through all both and the other way through all
sketch "Sketch6" plane through (0, 339, 0) normal (0, 1, 0) x (1, 0, 0)
  line L0 (-28.5041, 0.1269) -> (24.6218, 14.362) construction
  line L1 (-103.156, 75.8871) -> (-77.2741, -20.7055) construction
  line L2 (-77.2741, -20.7055) -> (-103.156, 75.8871) construction
  line L3 (-103.156, 75.8871) -> (51.3922, 117.2981) construction
  line L4 (-25.8819, 96.5926) -> (-1.9411, 7.2444) construction
  circle A0 centre (-28.5041, 0.1269) radius 2.5
  circle A1 centre (24.6218, 14.362) radius 2.5
  line L5 (-103.156, 235.8871) -> (-77.2741, 332.4796) construction
  line L6 (51.3922, 194.476) -> (77.2741, 291.0686) construction
  line L7 (-103.156, 235.8871) -> (51.3922, 194.476) construction
  line L8 (-25.8819, 215.1815) -> (-1.9411, 304.5297) construction
  line L9 (24.6218, 297.4122) -> (-28.5041, 311.6472) construction
  circle A2 centre (-28.5041, 311.6472) radius 2.5
  circle A3 centre (24.6218, 297.4122) radius 2.5
  point P0 (0, 0)
  dimension "d64" = 55
  dimension "d65" = 92.5
  dimension "d66" = 5
  dimension "d67" = 5
  dimension "d68" = 92.5
  dimension "d69" = 5
  dimension "d70" = 5
  dimension "d71" = 55
extrude "Extrusion5" cut sketch "Sketch6" against normal blind 25
sketch "Sketch9" plane through (-77.2741, 0, 20.7055) normal (-0.9659258, 0, 0.258819) x (0.258819, 0, 0.9659258)
  line L0 (-10, 314) -> (-5, 314) projected
  line L1 (-10, 339) -> (-5, 339) projected
  line L2 (-10, 314) -> (-5, 314) projected
  line L3 (-10, 339) -> (-5, 339) projected
  line L4 (-12.5, 334) -> (-2.5, 334)
  line L5 (-2.5, 334) -> (-2.5, 329)
  line L6 (-2.5, 329) -> (-12.5, 329)
  line L7 (-12.5, 329) -> (-12.5, 334)
  point P0 (0, 0)
  point P1 (-7.5, 334)
  point P2 (-7.5, 339)
  dimension "d80" = 10
  dimension "d81" = 5
  dimension "d82" = 5
extrude "Extrusion7" cut sketch "Sketch9" against normal through all
sketch "Sketch10" plane through (-103.156, 0, -235.8871) normal (-0.9659258, 0, -0.258819) x (-0.258819, 0, 0.9659258)
  line L0 (-95, 314) -> (-90, 314) projected
  line L1 (-95, 339) -> (-90, 339) projected
  line L2 (-97.5, 334) -> (-87.5, 334)
  line L3 (-87.5, 334) -> (-87.5, 329)
  line L4 (-87.5, 329) -> (-97.5, 329)
  line L5 (-97.5, 329) -> (-97.5, 334)
  point P0 (201.1507, 0)
  point P1 (-92.5, 334)
  point P2 (-92.5, 339)
  dimension "d85" = 10
  dimension "d86" = 5
  dimension "d87" = 5
extrude "Extrusion8" cut sketch "Sketch10" against normal through all
properties part number "TA001" material "ABS Plastic"
